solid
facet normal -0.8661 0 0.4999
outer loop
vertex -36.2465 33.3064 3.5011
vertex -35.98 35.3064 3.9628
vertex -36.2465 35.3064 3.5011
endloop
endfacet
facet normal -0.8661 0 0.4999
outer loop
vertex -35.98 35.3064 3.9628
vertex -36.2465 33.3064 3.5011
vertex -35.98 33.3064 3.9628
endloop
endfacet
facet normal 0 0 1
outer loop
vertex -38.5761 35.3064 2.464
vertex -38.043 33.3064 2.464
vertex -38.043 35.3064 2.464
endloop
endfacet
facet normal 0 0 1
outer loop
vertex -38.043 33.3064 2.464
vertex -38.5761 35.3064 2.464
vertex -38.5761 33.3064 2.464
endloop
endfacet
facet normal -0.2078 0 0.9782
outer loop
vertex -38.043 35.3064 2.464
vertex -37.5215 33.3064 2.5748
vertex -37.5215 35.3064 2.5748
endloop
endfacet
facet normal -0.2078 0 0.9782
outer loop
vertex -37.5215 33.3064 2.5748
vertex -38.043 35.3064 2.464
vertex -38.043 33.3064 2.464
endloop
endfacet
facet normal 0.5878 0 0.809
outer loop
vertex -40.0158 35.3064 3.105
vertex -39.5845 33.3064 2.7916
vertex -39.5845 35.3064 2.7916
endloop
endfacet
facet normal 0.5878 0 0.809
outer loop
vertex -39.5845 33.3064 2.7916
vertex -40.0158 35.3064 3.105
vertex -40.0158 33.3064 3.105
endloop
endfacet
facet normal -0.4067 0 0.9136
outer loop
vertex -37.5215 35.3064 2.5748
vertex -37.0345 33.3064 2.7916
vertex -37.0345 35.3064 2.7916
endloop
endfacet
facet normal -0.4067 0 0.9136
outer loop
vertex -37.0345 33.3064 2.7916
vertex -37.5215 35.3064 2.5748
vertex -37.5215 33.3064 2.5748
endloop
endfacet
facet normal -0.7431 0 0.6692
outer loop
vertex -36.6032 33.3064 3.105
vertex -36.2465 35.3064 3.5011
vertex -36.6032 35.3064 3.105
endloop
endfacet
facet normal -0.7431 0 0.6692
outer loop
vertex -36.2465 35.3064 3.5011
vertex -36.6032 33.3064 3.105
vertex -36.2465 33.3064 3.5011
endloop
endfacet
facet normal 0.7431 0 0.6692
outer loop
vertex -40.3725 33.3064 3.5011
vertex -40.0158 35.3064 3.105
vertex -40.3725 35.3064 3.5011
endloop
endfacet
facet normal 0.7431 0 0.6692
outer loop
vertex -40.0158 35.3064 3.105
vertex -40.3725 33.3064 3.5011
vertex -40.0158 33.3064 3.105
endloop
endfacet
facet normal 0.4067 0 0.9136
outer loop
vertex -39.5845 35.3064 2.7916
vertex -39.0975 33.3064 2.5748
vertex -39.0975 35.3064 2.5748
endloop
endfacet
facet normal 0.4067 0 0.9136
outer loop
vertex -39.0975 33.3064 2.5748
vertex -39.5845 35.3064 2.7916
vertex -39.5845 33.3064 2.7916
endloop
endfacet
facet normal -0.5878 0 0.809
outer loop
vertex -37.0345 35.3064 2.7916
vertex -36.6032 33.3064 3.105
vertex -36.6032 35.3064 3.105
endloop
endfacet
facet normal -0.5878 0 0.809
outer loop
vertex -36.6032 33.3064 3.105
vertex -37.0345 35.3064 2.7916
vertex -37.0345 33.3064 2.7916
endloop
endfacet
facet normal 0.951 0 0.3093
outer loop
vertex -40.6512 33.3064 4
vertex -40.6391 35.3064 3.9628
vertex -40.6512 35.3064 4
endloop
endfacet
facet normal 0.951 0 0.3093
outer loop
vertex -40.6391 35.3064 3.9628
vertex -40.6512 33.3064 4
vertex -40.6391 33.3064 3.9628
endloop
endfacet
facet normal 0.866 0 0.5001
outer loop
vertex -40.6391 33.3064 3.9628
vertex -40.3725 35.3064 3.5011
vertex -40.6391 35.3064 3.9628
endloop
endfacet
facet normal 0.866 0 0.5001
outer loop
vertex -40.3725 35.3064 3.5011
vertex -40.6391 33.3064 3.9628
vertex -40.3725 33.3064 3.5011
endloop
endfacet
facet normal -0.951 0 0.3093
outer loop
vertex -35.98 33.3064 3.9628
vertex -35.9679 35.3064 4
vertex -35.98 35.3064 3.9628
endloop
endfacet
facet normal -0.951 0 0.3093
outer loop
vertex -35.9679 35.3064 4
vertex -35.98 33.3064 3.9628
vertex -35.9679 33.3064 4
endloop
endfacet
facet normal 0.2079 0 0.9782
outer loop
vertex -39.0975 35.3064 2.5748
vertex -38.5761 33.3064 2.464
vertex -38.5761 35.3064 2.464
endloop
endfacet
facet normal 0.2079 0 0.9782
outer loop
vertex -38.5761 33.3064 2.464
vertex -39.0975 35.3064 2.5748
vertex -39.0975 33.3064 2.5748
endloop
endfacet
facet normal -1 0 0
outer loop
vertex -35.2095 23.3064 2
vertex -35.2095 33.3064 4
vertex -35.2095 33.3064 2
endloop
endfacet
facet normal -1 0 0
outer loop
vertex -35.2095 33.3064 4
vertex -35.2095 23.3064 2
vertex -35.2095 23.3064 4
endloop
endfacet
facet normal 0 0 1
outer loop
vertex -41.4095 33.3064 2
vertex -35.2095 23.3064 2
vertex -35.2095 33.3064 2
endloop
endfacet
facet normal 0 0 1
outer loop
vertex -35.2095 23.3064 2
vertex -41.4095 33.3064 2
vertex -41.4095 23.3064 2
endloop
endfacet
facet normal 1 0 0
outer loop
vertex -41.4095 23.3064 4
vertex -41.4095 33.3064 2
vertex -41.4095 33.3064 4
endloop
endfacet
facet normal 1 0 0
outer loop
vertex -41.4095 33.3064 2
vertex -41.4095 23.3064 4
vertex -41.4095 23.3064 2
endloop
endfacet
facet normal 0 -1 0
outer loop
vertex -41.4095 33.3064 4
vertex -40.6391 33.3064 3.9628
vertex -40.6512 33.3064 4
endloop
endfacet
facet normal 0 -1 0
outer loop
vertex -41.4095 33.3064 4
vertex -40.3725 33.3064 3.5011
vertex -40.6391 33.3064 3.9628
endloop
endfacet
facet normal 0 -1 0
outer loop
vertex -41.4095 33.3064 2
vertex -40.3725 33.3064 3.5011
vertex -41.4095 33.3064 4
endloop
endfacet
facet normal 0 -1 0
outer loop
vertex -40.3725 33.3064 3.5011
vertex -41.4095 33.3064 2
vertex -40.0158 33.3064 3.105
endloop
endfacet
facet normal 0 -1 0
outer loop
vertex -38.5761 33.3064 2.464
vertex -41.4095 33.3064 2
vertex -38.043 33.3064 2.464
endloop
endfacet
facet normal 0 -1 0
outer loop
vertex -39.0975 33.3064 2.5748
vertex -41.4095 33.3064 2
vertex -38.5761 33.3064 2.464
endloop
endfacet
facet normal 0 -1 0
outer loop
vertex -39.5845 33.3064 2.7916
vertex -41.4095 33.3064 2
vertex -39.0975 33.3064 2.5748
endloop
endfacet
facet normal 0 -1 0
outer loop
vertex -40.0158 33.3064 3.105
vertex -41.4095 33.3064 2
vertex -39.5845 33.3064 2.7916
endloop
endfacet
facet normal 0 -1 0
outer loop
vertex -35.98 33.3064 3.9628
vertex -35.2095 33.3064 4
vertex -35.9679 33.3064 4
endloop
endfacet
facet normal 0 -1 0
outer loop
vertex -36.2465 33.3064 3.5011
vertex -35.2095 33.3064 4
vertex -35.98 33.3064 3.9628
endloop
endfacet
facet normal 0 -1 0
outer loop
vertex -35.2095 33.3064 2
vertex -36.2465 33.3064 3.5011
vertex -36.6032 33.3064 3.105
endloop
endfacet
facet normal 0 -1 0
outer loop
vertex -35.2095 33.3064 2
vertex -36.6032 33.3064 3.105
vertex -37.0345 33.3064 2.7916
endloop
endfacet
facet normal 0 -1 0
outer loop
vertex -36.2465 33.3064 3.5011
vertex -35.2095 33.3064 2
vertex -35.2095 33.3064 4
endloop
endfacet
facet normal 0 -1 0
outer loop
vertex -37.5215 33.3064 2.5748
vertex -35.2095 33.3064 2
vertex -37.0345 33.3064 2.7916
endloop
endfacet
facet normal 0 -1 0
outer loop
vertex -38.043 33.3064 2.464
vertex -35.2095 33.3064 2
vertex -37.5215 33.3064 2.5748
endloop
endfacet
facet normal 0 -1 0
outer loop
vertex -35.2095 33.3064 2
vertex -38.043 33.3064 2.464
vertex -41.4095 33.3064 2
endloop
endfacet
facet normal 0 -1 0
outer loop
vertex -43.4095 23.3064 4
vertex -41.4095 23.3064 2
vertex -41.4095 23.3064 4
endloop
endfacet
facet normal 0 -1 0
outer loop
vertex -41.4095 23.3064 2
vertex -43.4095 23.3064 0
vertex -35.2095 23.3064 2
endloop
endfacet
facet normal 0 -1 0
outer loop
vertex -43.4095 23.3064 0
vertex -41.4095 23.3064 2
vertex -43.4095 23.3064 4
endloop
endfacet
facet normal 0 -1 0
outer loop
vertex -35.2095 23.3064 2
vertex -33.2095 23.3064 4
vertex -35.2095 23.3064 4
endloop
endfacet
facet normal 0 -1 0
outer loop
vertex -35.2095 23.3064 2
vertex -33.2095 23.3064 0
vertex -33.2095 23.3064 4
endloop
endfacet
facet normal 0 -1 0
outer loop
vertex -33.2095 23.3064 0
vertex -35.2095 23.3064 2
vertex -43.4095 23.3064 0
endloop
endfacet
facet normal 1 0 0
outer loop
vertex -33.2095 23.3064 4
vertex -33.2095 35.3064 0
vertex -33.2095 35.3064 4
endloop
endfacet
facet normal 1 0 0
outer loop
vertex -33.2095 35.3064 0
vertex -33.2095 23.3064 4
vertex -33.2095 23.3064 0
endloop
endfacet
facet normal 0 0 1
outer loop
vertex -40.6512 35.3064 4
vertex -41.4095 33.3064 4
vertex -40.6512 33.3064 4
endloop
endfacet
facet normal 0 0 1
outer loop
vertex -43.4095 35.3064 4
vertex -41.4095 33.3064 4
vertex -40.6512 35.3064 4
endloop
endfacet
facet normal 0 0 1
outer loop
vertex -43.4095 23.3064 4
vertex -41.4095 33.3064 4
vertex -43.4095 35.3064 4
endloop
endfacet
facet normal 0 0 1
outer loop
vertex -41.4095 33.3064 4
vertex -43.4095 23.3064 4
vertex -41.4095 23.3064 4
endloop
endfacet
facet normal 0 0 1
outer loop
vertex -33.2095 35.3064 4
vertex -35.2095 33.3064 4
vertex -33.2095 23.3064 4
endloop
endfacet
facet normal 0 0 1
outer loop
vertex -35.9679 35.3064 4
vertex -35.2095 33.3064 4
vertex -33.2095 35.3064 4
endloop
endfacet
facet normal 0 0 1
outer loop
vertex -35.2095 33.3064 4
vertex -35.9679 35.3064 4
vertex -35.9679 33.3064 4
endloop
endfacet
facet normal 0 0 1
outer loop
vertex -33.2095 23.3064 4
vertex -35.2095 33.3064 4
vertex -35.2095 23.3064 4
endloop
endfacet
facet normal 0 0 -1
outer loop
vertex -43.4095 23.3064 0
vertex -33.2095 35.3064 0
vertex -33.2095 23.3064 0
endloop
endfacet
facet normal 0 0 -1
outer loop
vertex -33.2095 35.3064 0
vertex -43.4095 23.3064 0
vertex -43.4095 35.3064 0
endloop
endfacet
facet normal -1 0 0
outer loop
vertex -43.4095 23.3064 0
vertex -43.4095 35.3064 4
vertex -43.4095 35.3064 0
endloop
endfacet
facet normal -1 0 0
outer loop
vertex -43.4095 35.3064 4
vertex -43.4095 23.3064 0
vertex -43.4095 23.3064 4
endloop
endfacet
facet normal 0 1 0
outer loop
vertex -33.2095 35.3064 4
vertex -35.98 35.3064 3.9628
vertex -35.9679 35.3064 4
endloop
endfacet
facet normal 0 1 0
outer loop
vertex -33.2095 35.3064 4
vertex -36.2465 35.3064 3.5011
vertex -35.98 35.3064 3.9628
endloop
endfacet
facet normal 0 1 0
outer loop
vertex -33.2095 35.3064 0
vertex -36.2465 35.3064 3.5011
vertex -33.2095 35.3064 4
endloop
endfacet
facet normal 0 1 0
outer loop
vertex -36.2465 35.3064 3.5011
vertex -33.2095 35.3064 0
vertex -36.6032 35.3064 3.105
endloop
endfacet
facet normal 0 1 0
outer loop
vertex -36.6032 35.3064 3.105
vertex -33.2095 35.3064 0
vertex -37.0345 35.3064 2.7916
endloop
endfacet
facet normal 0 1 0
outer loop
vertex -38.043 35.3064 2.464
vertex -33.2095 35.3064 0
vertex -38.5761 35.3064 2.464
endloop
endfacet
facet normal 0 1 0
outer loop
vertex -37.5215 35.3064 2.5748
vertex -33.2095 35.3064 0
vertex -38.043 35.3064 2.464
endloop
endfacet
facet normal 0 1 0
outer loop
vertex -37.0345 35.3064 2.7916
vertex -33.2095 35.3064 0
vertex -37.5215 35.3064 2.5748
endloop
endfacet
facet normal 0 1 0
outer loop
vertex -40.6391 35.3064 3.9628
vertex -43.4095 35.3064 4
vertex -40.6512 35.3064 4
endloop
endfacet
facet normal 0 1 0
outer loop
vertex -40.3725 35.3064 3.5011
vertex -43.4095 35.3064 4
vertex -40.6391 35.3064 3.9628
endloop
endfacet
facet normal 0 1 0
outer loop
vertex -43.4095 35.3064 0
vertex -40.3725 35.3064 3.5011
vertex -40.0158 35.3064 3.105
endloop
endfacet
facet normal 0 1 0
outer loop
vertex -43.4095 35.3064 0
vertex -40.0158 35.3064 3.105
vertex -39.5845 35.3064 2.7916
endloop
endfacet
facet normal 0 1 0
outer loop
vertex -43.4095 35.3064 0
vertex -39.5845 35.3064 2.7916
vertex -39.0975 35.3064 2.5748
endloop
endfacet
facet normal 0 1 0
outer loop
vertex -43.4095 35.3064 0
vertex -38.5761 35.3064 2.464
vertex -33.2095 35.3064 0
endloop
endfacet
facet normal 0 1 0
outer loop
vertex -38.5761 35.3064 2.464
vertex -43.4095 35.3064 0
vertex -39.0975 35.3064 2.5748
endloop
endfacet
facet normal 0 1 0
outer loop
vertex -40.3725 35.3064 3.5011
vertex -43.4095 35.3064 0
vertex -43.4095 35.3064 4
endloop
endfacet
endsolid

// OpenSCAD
difference () {
  union () {
    translate ([-38.30953167499939, 29.30644042799168, 2]) {
      cube ([10.2, 12, 4], center=true);
    }
  }
  union () {
    translate ([-38.30953167499939, 35.30644042799168, 5]) {
      rotate (a=90.0, v=[1, 0, 0]) {
        cylinder ($fn=30, h=20, r=2.55, center=true);
      }
    }
    translate ([-38.30953167499939, 28.30644042799168, 5]) {
      cube ([6.2, 10, 6], center=true);
    }
  }
}
